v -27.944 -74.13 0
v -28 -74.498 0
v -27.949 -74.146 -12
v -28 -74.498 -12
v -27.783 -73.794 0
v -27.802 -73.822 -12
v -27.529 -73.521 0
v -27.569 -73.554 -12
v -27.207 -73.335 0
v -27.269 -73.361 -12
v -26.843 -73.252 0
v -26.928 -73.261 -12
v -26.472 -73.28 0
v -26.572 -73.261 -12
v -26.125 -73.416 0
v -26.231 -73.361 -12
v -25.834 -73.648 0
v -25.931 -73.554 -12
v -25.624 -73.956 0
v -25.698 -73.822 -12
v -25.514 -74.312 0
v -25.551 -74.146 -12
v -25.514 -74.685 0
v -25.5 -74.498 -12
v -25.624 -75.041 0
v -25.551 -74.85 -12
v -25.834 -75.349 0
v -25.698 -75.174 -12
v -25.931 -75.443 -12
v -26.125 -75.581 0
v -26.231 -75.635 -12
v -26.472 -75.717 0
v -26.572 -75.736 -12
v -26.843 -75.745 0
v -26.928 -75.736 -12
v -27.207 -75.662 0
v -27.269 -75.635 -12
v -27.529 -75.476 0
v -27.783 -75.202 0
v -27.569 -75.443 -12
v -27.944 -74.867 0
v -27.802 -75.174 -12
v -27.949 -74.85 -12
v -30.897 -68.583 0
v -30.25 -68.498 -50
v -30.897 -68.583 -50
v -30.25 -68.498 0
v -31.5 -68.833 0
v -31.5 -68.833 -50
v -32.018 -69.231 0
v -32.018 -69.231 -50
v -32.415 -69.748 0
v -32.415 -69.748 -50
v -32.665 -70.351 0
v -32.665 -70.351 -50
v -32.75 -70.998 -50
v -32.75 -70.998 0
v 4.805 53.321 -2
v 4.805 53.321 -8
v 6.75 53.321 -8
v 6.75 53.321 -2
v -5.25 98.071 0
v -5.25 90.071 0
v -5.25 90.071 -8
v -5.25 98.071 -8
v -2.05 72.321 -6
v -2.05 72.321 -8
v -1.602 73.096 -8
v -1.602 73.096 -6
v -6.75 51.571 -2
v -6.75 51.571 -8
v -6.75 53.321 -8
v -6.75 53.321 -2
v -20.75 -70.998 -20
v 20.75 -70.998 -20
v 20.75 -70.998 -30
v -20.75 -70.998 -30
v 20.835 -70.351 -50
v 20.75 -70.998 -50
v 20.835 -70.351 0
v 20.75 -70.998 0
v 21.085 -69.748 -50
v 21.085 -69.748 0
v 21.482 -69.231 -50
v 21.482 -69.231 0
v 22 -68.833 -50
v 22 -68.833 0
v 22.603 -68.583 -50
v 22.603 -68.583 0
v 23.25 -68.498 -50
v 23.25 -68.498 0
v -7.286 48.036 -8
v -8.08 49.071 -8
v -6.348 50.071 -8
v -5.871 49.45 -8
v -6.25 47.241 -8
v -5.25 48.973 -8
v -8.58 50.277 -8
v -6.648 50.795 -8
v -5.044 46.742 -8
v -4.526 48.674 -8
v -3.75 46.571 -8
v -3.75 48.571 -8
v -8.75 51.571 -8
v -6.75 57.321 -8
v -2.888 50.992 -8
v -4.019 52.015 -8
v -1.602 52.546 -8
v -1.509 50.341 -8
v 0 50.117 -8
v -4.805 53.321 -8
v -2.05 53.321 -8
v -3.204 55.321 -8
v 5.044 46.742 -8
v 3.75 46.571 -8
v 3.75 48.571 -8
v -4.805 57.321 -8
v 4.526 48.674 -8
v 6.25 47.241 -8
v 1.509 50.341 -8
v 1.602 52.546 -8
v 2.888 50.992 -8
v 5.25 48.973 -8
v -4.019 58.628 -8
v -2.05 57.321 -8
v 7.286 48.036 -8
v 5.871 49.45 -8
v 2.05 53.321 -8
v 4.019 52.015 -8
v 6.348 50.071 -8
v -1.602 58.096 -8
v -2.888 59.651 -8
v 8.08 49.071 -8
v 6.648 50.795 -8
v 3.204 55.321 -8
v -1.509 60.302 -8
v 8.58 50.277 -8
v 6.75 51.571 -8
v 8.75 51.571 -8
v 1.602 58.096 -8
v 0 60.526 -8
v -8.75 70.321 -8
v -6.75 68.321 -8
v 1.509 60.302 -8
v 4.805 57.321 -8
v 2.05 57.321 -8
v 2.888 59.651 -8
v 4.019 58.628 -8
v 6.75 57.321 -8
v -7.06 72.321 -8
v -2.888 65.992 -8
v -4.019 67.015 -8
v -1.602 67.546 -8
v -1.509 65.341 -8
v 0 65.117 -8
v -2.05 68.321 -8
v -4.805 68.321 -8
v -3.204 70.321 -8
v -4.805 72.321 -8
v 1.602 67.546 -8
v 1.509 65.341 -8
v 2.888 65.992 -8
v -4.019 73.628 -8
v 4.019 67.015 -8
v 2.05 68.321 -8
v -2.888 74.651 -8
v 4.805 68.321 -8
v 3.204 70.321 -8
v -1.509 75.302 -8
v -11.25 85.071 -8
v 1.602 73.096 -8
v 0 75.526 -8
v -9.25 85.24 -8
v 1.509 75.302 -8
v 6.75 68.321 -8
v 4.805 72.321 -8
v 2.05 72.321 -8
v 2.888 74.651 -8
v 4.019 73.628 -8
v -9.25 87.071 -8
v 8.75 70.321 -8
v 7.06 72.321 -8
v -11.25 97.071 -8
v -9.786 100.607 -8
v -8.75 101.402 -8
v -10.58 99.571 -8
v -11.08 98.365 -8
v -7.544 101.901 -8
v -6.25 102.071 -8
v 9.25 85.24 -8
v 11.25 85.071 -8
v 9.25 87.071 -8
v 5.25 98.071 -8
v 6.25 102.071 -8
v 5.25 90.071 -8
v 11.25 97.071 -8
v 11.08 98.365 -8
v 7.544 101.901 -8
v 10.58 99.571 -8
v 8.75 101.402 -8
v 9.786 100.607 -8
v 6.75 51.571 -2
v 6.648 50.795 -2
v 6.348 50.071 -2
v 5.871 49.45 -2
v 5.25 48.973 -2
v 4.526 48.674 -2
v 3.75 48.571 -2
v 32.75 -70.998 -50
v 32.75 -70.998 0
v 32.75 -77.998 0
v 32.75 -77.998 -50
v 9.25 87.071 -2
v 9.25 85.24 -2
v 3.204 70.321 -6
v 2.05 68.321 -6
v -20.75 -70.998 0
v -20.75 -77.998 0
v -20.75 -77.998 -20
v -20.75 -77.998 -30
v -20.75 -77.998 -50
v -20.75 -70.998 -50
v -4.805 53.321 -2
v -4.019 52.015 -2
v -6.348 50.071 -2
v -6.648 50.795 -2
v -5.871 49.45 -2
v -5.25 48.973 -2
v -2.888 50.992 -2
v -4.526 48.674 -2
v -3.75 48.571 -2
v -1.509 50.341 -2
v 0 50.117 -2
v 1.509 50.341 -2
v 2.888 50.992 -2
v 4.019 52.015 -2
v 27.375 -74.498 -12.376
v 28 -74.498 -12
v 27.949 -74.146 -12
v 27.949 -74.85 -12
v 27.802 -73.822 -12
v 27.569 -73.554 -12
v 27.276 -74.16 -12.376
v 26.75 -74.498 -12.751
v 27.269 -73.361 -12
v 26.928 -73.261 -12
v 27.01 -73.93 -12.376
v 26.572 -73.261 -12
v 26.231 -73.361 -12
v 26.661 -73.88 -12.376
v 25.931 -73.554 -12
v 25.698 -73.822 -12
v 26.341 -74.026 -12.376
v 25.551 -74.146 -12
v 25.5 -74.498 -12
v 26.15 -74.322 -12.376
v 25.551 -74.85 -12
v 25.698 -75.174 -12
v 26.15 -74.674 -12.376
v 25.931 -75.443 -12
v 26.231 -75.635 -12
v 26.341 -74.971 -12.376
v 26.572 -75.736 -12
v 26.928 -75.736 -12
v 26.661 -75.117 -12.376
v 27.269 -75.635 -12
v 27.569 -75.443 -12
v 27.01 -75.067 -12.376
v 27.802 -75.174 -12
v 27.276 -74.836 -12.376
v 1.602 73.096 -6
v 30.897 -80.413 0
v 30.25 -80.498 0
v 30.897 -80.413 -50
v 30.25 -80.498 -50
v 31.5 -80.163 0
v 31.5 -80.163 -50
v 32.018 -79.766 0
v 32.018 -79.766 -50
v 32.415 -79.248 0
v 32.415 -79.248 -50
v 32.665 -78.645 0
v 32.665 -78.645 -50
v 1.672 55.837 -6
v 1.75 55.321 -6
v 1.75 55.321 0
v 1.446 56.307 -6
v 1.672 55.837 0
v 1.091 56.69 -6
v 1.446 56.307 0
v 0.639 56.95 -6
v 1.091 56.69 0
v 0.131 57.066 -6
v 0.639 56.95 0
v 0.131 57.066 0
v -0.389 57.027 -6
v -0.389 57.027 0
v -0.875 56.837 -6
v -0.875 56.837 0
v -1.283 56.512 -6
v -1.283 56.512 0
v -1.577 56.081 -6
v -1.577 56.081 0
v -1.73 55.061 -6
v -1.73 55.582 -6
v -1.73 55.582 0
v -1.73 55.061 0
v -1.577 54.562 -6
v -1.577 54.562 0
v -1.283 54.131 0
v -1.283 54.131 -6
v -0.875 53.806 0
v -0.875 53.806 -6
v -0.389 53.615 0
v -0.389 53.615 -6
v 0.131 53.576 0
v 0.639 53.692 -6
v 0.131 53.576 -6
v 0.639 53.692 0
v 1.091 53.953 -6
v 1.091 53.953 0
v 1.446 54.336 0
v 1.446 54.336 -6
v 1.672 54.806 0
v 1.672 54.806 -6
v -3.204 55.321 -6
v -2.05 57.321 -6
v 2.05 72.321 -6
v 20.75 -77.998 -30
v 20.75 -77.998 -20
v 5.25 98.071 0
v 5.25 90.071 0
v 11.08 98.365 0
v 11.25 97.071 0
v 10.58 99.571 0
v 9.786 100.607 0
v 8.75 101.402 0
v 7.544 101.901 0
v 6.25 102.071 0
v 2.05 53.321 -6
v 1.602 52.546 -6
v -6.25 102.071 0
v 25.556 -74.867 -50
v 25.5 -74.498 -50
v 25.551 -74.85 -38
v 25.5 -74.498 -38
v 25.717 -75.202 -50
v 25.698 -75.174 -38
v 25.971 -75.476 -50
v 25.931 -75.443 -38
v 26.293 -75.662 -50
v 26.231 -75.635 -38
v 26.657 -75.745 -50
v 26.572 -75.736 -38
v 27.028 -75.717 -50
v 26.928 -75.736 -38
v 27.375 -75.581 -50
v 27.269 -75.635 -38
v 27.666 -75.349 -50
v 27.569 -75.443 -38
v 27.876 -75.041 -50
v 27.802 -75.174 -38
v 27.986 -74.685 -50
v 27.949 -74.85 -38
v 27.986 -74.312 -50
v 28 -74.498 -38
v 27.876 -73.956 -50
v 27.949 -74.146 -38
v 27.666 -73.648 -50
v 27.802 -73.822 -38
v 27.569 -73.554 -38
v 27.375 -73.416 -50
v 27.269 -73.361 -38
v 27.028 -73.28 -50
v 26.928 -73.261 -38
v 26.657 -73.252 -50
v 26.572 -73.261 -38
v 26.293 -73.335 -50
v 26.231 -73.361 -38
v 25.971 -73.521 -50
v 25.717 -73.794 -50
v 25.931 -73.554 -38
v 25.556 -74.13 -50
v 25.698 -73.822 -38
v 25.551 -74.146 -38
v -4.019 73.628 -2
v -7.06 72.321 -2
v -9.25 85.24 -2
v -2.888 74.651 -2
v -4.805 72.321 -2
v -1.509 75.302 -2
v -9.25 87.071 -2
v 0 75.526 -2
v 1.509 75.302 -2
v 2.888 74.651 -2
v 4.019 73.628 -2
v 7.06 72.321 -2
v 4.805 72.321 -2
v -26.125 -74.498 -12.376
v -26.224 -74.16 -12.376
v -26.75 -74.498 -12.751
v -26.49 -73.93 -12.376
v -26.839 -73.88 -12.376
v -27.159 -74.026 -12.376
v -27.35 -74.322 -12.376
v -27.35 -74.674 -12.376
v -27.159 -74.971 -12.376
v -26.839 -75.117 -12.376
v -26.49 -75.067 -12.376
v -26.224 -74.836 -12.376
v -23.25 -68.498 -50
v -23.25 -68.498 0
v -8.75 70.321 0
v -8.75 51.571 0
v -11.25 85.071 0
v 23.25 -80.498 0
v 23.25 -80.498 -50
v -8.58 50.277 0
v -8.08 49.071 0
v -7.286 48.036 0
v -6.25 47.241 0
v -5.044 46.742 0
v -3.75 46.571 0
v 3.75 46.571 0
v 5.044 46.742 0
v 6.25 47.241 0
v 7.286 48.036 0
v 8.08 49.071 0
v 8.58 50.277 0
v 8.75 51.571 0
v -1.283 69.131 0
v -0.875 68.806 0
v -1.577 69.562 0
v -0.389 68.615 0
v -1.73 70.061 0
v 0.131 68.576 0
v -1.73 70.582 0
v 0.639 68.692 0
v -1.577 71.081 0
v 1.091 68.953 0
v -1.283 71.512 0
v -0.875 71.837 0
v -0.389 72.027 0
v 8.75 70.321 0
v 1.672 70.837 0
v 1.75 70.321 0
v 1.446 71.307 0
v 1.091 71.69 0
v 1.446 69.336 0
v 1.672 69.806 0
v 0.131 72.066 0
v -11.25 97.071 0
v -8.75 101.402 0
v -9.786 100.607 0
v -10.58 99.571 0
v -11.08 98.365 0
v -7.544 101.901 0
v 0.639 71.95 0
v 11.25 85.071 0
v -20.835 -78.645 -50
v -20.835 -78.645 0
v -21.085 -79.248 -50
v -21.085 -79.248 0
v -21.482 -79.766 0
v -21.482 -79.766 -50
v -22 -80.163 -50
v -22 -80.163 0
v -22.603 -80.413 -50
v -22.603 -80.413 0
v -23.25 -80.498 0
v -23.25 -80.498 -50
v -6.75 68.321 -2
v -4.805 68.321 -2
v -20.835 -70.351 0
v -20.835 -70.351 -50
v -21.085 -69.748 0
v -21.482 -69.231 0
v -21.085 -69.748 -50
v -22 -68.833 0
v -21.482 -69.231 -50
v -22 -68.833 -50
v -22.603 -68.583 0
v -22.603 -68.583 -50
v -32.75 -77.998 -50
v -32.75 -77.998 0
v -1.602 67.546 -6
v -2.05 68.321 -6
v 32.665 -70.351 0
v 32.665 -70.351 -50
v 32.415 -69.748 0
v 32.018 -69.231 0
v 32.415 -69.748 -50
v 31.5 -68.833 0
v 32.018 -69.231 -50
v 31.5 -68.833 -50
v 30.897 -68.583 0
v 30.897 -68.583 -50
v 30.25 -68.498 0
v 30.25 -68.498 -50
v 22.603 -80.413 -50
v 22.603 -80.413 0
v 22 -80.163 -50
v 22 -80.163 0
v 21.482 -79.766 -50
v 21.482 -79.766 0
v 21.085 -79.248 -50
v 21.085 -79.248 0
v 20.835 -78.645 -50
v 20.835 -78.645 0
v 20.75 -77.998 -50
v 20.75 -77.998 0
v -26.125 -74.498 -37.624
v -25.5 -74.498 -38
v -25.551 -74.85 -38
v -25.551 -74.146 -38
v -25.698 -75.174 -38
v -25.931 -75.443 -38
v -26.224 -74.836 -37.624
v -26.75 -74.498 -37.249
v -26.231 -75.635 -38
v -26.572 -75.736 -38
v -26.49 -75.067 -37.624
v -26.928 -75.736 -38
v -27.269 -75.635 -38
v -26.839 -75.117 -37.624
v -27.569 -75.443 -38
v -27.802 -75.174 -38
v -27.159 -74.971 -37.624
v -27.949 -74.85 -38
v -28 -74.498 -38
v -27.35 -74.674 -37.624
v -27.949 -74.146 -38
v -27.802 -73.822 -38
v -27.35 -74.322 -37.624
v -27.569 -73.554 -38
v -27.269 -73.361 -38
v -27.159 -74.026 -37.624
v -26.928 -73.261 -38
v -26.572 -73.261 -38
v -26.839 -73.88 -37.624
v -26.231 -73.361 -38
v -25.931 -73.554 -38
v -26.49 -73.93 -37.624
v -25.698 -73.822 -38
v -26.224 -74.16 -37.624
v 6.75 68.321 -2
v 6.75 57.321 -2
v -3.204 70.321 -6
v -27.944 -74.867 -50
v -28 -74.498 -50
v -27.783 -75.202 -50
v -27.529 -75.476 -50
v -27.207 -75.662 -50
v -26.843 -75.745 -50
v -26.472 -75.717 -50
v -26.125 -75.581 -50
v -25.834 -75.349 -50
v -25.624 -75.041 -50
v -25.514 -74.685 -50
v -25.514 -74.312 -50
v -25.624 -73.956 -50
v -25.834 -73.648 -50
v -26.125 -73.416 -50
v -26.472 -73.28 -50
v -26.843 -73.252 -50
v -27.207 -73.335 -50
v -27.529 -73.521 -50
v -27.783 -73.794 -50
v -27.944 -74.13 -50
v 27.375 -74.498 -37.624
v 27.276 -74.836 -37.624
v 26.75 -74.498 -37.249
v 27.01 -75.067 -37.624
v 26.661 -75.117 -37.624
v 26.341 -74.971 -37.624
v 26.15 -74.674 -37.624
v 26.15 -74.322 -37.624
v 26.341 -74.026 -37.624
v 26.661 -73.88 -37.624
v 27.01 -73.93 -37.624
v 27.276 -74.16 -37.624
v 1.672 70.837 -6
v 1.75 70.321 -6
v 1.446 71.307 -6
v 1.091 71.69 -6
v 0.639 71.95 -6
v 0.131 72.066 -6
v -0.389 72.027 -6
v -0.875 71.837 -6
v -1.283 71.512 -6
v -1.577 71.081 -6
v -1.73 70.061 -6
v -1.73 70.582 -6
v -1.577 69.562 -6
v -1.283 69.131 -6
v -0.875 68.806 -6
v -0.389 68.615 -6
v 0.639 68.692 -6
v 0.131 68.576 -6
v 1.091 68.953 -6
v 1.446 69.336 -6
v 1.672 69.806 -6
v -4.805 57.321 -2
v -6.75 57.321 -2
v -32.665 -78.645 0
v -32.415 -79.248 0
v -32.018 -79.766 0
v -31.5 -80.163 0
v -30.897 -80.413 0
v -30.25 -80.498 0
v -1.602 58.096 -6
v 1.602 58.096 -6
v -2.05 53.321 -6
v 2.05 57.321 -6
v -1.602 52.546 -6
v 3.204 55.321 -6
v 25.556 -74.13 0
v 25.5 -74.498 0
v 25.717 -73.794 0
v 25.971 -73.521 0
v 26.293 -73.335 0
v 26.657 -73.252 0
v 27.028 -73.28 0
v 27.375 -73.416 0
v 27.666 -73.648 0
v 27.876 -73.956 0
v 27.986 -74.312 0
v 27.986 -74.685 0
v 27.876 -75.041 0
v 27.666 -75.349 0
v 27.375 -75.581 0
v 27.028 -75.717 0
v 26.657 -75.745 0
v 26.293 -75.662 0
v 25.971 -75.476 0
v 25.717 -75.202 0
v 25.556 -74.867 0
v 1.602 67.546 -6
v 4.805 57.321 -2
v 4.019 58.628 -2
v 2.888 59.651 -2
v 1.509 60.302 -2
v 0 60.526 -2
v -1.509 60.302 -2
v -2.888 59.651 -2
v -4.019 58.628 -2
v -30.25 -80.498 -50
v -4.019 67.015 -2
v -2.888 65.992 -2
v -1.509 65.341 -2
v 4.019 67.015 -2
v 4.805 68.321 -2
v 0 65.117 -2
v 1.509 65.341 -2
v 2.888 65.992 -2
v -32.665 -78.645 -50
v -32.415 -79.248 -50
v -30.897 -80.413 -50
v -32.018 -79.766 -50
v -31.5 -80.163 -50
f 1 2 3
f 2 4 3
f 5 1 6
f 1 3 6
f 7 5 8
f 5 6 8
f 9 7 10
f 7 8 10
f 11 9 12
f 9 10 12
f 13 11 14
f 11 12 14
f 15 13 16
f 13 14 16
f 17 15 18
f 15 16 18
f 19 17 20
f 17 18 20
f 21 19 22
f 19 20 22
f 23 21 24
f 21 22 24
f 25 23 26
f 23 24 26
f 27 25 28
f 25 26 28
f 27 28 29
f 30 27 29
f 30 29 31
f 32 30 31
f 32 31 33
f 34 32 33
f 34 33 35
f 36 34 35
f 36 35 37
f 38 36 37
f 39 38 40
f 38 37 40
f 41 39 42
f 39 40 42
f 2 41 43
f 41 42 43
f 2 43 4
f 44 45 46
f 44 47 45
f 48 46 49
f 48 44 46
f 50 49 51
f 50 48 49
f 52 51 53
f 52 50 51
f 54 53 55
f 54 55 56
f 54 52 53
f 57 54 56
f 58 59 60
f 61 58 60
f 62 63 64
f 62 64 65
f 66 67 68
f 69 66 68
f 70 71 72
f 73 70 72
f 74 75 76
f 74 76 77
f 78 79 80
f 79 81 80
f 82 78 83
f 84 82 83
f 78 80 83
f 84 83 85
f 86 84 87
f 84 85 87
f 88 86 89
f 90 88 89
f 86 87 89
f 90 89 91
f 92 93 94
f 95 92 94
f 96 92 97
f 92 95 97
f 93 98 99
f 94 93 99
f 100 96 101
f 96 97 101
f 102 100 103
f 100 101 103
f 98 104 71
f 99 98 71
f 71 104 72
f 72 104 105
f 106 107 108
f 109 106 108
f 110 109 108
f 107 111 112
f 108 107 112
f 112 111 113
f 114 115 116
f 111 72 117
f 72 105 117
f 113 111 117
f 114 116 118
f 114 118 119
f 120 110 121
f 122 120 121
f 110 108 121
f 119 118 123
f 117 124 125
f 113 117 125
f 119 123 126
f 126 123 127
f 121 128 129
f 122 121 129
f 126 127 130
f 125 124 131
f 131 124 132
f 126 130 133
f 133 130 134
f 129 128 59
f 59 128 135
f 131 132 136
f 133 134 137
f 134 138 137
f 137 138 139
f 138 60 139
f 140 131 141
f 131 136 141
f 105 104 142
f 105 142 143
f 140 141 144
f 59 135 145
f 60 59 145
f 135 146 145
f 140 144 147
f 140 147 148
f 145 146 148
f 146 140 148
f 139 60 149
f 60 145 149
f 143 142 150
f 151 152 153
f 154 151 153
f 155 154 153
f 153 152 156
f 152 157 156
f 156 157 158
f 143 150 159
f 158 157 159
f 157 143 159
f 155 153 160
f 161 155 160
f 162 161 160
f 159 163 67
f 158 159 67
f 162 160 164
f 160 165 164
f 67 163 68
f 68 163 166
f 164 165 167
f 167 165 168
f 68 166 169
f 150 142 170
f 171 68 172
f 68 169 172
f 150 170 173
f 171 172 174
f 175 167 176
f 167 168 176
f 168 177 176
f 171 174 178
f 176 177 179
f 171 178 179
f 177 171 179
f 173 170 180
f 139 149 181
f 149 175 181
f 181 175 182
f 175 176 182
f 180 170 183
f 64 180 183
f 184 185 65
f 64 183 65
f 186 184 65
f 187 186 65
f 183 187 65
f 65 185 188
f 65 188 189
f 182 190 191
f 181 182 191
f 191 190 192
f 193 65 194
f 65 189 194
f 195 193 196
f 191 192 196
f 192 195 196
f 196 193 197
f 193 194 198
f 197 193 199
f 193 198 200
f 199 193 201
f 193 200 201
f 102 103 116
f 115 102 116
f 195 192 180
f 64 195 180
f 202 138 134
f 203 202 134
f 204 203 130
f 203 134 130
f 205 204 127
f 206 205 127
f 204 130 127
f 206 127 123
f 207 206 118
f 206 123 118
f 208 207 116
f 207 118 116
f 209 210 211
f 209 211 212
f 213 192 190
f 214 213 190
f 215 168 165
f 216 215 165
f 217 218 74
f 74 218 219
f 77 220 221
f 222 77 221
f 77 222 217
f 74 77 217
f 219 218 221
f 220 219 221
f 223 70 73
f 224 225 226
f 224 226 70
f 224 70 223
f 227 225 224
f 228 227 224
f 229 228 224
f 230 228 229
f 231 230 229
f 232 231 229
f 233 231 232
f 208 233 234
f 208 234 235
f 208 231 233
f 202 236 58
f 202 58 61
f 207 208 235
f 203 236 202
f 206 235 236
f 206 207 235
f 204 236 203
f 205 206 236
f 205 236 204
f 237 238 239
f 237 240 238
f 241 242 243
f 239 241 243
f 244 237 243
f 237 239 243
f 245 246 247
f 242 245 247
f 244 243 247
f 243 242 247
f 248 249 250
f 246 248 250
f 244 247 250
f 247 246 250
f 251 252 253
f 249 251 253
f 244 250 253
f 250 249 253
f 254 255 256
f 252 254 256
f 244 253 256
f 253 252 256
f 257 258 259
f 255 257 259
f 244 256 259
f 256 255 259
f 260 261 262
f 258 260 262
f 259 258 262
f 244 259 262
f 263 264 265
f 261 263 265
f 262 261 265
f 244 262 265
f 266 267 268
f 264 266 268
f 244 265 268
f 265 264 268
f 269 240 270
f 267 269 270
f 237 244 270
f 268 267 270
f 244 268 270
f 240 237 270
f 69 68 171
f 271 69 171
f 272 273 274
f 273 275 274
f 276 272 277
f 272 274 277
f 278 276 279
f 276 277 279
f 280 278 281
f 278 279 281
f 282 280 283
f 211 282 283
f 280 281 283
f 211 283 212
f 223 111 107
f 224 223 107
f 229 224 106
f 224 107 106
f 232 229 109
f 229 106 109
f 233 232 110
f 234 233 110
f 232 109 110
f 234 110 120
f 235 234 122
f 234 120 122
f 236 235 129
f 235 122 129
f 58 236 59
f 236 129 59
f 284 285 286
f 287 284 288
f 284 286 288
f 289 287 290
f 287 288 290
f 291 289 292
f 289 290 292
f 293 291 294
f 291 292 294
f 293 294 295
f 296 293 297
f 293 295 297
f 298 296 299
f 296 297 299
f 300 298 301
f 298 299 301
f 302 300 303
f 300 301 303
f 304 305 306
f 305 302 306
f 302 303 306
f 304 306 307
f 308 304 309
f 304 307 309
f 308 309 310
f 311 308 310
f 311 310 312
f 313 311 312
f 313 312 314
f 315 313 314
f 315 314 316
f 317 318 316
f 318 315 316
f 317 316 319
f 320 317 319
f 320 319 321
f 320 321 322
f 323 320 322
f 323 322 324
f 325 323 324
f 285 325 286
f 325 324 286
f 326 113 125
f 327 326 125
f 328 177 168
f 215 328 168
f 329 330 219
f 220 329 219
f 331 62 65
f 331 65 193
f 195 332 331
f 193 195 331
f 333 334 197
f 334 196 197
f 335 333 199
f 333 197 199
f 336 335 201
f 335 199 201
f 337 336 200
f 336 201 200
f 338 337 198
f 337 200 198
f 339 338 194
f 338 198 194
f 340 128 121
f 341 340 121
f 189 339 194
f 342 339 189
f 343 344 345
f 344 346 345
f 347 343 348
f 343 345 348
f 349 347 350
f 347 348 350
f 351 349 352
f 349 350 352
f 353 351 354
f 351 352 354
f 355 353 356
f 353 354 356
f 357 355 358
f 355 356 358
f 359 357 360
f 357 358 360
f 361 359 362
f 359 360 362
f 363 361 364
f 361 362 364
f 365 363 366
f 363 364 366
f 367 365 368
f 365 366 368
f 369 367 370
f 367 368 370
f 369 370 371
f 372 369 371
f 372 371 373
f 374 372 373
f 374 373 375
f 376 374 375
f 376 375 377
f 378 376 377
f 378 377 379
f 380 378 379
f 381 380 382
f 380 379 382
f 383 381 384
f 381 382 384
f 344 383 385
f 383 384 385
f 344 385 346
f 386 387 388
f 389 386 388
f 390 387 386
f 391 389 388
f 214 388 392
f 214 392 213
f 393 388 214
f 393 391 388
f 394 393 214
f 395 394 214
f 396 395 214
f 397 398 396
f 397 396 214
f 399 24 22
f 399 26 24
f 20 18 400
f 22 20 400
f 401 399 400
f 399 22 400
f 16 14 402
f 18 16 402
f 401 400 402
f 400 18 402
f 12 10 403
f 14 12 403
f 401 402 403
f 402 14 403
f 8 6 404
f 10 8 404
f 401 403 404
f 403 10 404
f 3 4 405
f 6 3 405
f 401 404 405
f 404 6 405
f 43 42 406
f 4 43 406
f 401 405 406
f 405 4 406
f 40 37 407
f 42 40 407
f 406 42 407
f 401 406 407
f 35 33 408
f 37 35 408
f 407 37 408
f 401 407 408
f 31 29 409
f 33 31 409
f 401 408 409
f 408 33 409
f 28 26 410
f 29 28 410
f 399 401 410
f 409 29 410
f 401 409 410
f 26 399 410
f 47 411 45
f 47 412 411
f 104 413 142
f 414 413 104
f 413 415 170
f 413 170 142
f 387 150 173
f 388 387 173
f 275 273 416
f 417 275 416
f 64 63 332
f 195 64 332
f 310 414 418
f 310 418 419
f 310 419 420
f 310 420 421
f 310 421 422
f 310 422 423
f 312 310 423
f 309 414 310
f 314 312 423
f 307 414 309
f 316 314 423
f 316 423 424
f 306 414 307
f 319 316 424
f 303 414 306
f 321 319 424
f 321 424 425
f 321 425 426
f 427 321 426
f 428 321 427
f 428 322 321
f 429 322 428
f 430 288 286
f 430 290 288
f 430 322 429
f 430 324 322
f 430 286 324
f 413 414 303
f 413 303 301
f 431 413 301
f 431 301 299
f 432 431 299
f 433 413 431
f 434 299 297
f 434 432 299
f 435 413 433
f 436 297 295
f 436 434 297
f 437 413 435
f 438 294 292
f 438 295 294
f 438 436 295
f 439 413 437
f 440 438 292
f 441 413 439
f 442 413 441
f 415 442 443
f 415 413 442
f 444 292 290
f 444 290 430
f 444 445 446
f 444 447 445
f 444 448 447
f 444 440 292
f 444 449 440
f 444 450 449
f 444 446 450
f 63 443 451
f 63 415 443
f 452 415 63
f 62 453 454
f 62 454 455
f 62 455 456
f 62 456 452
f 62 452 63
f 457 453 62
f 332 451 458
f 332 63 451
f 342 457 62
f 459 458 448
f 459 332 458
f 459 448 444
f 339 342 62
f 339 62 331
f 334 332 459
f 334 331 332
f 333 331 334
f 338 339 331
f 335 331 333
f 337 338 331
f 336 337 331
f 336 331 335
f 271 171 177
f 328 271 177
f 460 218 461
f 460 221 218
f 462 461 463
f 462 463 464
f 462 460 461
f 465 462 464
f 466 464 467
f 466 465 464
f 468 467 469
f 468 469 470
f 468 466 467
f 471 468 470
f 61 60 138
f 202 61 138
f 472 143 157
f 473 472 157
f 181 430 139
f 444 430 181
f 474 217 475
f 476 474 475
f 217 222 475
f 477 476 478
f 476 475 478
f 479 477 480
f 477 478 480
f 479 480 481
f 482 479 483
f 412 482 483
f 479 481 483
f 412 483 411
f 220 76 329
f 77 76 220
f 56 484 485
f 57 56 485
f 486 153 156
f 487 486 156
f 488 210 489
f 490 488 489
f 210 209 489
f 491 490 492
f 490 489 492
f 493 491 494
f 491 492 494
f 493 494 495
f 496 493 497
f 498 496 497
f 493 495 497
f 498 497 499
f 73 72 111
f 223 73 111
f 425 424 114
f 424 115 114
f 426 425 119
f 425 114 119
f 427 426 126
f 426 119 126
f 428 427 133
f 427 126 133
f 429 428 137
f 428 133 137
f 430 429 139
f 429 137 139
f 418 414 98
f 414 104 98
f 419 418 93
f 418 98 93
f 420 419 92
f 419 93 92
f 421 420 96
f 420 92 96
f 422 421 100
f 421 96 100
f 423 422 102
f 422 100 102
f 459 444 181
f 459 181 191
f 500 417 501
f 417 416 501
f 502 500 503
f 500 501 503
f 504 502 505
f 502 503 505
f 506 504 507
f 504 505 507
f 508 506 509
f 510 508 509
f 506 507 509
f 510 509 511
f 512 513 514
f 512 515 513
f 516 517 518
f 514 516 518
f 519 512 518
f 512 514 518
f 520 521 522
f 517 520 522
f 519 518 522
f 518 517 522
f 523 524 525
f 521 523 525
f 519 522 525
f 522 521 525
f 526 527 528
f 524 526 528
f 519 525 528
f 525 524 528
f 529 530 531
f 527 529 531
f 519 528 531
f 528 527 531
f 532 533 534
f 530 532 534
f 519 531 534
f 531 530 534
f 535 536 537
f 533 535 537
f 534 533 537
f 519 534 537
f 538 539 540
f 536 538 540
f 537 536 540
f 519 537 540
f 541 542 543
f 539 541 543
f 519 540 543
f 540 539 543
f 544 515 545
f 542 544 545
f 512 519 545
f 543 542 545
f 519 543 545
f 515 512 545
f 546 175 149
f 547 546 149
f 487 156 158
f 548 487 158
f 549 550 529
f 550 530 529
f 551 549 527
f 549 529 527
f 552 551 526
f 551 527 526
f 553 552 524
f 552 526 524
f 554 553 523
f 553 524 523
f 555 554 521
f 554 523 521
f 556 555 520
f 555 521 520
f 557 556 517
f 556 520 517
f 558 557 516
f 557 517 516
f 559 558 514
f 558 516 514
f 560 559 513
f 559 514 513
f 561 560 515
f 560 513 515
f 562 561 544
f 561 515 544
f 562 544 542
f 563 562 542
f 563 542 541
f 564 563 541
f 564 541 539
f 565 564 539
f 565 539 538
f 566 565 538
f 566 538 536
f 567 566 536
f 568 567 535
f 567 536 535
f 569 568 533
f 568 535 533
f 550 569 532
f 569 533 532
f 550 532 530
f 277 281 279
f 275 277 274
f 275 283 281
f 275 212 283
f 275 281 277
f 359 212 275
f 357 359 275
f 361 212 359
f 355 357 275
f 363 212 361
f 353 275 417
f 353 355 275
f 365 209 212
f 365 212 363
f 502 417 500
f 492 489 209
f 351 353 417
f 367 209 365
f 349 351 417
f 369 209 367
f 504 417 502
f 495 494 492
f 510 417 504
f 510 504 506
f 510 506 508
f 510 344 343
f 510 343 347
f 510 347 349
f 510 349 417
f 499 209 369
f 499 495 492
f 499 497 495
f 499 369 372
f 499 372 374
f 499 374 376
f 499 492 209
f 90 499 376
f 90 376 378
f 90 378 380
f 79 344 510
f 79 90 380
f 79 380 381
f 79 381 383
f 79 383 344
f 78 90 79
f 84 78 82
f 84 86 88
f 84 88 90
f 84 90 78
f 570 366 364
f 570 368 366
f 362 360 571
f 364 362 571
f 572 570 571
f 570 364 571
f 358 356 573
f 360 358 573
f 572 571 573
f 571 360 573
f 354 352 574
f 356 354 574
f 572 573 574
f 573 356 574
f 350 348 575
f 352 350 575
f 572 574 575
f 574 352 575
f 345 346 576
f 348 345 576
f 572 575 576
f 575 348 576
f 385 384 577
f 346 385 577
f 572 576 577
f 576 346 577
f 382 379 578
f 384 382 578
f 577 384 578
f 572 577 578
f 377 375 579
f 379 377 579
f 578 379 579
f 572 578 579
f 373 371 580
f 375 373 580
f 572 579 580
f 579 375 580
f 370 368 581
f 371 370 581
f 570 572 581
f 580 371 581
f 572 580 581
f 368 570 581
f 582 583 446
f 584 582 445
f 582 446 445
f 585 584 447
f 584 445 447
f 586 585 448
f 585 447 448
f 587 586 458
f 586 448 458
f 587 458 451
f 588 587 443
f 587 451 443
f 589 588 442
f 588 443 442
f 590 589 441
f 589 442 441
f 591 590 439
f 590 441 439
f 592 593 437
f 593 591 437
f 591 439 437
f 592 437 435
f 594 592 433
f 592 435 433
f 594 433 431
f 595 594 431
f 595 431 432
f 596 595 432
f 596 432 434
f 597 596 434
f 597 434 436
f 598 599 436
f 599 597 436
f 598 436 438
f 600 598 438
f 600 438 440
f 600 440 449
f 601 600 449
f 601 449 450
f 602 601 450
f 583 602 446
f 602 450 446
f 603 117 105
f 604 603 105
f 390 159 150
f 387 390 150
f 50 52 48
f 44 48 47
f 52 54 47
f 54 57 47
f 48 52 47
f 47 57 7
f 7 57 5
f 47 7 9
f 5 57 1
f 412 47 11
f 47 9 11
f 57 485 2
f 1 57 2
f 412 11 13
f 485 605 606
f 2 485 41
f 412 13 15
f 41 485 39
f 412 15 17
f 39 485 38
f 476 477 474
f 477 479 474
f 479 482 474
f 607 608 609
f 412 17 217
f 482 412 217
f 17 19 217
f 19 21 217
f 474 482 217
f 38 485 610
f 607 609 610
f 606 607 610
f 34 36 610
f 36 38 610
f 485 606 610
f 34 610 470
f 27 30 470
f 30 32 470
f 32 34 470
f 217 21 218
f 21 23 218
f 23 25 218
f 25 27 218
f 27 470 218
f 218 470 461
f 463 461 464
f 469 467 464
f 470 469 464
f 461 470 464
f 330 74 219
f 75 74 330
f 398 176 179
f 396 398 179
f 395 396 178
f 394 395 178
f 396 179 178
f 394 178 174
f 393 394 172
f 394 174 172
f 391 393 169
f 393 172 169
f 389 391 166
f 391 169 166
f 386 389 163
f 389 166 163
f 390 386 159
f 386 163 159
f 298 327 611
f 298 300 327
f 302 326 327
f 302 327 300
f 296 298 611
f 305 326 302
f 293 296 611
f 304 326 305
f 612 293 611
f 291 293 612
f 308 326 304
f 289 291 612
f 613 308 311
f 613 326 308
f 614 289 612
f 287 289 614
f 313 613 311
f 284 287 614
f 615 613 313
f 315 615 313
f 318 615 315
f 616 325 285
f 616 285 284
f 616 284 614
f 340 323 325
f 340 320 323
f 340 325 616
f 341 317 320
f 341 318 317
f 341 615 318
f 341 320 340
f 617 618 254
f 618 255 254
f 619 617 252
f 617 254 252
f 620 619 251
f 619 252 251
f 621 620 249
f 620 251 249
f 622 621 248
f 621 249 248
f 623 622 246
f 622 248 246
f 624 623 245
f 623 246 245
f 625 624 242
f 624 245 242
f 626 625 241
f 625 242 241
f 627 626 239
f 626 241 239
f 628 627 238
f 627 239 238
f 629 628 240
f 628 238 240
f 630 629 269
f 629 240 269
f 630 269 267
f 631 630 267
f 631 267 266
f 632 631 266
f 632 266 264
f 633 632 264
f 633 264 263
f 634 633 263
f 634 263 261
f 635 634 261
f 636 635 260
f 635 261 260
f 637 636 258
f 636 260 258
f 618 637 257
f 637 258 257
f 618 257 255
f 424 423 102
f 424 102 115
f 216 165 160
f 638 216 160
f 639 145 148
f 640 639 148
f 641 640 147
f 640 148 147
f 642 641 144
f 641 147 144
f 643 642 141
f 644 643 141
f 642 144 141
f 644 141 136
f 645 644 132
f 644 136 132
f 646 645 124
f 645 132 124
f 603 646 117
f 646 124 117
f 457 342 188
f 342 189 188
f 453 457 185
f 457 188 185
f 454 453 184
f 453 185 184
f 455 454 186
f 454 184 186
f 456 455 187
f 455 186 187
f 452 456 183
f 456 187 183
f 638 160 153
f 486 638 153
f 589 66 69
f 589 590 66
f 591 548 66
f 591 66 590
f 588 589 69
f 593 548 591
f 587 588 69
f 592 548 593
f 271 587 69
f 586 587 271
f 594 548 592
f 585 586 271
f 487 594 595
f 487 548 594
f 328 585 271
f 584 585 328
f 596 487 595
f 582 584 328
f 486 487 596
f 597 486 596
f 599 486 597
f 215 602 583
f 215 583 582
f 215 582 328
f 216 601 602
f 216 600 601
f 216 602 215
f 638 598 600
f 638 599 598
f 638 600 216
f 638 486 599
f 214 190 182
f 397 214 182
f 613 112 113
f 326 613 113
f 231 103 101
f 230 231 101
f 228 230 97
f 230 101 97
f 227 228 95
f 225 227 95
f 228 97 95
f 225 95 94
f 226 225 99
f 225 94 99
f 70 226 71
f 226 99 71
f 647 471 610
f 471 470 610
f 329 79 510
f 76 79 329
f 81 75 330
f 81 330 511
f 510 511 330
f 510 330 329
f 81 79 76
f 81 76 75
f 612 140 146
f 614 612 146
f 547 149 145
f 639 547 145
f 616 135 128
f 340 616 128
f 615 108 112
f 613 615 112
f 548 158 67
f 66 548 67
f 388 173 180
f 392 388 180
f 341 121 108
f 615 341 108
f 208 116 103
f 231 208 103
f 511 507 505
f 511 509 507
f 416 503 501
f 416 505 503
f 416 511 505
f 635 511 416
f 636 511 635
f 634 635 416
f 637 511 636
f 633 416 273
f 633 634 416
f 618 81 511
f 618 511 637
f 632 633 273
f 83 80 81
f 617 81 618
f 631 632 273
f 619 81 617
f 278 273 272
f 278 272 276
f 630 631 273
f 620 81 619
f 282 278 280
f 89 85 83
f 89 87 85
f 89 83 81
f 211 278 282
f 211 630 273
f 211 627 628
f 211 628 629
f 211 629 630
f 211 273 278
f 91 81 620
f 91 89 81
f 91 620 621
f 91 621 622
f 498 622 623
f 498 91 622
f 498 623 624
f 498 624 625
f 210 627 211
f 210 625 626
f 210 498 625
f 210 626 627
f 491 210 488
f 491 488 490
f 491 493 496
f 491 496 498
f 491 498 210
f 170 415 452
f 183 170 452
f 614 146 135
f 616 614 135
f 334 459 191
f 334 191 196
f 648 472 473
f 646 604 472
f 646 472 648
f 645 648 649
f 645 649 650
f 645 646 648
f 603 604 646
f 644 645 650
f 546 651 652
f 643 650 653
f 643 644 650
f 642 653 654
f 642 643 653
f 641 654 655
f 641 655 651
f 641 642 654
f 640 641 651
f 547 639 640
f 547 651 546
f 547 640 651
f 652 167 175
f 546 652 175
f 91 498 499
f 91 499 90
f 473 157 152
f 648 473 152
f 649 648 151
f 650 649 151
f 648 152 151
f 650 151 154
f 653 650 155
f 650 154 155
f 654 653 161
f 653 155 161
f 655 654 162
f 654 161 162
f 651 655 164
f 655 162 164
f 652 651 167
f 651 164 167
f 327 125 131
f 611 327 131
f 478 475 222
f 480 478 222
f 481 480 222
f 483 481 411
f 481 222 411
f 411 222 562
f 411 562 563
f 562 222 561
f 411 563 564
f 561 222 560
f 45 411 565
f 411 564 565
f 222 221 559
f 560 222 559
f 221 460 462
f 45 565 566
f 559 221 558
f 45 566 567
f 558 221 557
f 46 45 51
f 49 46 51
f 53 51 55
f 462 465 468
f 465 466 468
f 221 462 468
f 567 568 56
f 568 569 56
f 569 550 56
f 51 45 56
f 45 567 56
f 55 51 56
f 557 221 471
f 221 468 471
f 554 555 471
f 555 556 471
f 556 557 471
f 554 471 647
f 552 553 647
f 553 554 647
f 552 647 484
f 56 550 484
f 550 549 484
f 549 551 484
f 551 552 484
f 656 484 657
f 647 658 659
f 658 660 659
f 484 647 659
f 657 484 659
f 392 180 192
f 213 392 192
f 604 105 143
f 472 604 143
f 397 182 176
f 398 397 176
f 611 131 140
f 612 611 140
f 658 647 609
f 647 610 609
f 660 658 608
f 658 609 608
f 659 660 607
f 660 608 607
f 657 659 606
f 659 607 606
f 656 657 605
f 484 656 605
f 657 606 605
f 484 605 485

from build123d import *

# Parameters (mm, degrees)
F7_W      = 2.5
F7_H      = 17
F7_W_2    = 17.5
F7_W_3    = 10.5
F7_H_2    = 8
F7_R      = 1.75
F8_DEPTH  = 8
F9_R      = 5
F11_DEPTH = 6
F10_R     = 1.75
F12_DEPTH = 2
F15_DEPTH = 3.5
F16_DEPTH = 6
F18_D     = 2.5
F18_DEPTH = 12
F18_TIP   = 0.7510757738
F20_D     = 2.5
F20_DEPTH = 12
F20_TIP   = 0.7510757738
F21_R     = 2.49999


# Not quite as in the source:
# - a fillet or chamfer is up to 0.001 mm smaller than in the source, because OpenCascade refuses the exact size


with BuildPart() as f8:
    # F7 (on Top) → F8 (new body)
    with BuildSketch(Plane.XY):
        with Locations((10, 93.5713741661)):
            Rectangle(F7_W, F7_H)
        with Locations((0, 93.5713741661)):
            Rectangle(F7_W_2, F7_H)
        with Locations((0, 94.0713741661)):
            Rectangle(F7_W_3, F7_H_2, mode=Mode.SUBTRACT)
        with Locations((-10, 93.5713741661)):
            Rectangle(F7_W, F7_H)
        Polygon((-11.25, 85.0713741661), (-8.75, 70.3213741661), (-8.75, 85.0713741661), align=None)
        Polygon((-8.75, 46.5713741661), (8.75, 46.5713741661), (8.75, 70.3213741661), (8.75, 85.0713741661), (-8.75, 85.0713741661), (-8.75, 70.3213741661), align=None)
        with Locations((0, 55.3213741661)):
            Circle(F7_R, mode=Mode.SUBTRACT)
        with Locations((0, 70.3213741661)):
            Circle(F7_R, mode=Mode.SUBTRACT)
        Polygon((8.75, 85.0713741661), (8.75, 70.3213741661), (11.25, 85.0713741661), align=None)
    extrude(amount=-F8_DEPTH)

    # F9
    f9_edges = [f8.edges().sort_by_distance(p)[0] for p in [
        (11.25, 102.071374, -4),
        (8.75, 46.571374, -4),
        (-8.75, 46.571374, -4),
        (-11.25, 102.071374, -4),
    ]]
    fillet(f9_edges, radius=F9_R)

    # F10 (on face) → F11 (cut)
    with BuildSketch(Plane(origin=(0, 0, -8), x_dir=(1, 0, 0), z_dir=(0, 0, -1))):
        with BuildLine():
            Line((6.75, -57.3213741661), (4.8046514937, -57.3213741661))
            ThreePointArc((4.8046514937, -57.3213741661), (0, -60.5256681601), (-4.8046514937, -57.3213741661))
            Line((-4.8046514937, -57.3213741661), (-6.75, -57.3213741661))
            Line((-6.75, -57.3213741661), (-6.75, -68.3213741661))
            Line((-6.75, -68.3213741661), (-4.8046514937, -68.3213741661))
            ThreePointArc((-4.8046514937, -68.3213741661), (0, -65.1170801721), (4.8046514937, -68.3213741661))
            Line((4.8046514937, -68.3213741661), (6.75, -68.3213741661))
            Line((6.75, -68.3213741661), (6.75, -57.3213741661))
        make_face()
        with BuildLine():
            Line((-6.75, -53.3213741661), (-4.8046514937, -53.3213741661))
            ThreePointArc((-4.8046514937, -53.3213741661), (0, -50.1170801721), (4.8046514937, -53.3213741661))
            Line((4.8046514937, -53.3213741661), (6.75, -53.3213741661))
            Line((6.75, -53.3213741661), (6.75, -51.5713741661))
            ThreePointArc((6.75, -51.5713741661), (5.8713203436, -49.4500538226), (3.75, -48.5713741661))
            Line((3.75, -48.5713741661), (-3.75, -48.5713741661))
            ThreePointArc((-3.75, -48.5713741661), (-5.8713203436, -49.4500538226), (-6.75, -51.5713741661))
            Line((-6.75, -51.5713741661), (-6.75, -53.3213741661))
        make_face()
        with BuildLine():
            Line((9.25, -85.2396656064), (7.0604590779, -72.3213741661))
            Line((7.0604590779, -72.3213741661), (4.8046514937, -72.3213741661))
            ThreePointArc((4.8046514937, -72.3213741661), (0, -75.5256681601), (-4.8046514937, -72.3213741661))
            Line((-4.8046514937, -72.3213741661), (-7.0604590779, -72.3213741661))
            Line((-7.0604590779, -72.3213741661), (-9.25, -85.2396656064))
            Line((-9.25, -85.2396656064), (-9.25, -87.0713741661))
            Line((-9.25, -87.0713741661), (9.25, -87.0713741661))
            Line((9.25, -87.0713741661), (9.25, -85.2396656064))
        make_face()
    extrude(amount=-F11_DEPTH, mode=Mode.SUBTRACT)

    # F10 (on face) → F12 (cut)
    with BuildSketch(Plane(origin=(0, 0, -8), x_dir=(1, 0, 0), z_dir=(0, 0, -1))):
        Polygon((-2.0495934556, -57.3213741661), (2.0495934556, -57.3213741661), (3.204293994, -55.3213741661), (2.0495934556, -53.3213741661), (-2.0495934556, -53.3213741661), (-3.204293994, -55.3213741661), align=None)
        with Locations((0, -55.3213741661)):
            Circle(F10_R, mode=Mode.SUBTRACT)
        Polygon((-1.602146997, -58.0963741661), (1.602146997, -58.0963741661), (2.0495934556, -57.3213741661), (-2.0495934556, -57.3213741661), align=None)
        Polygon((-2.0495934556, -53.3213741661), (2.0495934556, -53.3213741661), (1.602146997, -52.5463741661), (-1.602146997, -52.5463741661), align=None)
        Polygon((2.0495934556, -72.3213741661), (-2.0495934556, -72.3213741661), (-1.602146997, -73.0963741661), (1.602146997, -73.0963741661), align=None)
        Polygon((3.204293994, -70.3213741661), (2.0495934556, -68.3213741661), (-2.0495934556, -68.3213741661), (-3.204293994, -70.3213741661), (-2.0495934556, -72.3213741661), (2.0495934556, -72.3213741661), align=None)
        with Locations((0, -70.3213741661)):
            Circle(F10_R, mode=Mode.SUBTRACT)
        Polygon((-2.0495934556, -68.3213741661), (2.0495934556, -68.3213741661), (1.602146997, -67.5463741661), (-1.602146997, -67.5463741661), align=None)
    extrude(amount=-F12_DEPTH, mode=Mode.SUBTRACT)


with BuildPart() as f15:
    # F14 (on line) → F15 (new body, symmetric)
    with BuildSketch(Plane(origin=(0, -74.4982883334, 0), x_dir=(-1, 0, 0), z_dir=(0, 1, 0))):
        Polygon((20.75, -20), (0, -20), (-20.75, -20), (-20.75, -30), (0, -30), (20.75, -30), align=None)
    extrude(amount=F15_DEPTH, both=True)

    # F14 (on line) → F16 (join, symmetric)
    with BuildSketch(Plane(origin=(0, -74.4982883334, 0), x_dir=(-1, 0, 0), z_dir=(0, 1, 0))):
        Polygon((20.75, 0), (20.75, -20), (20.75, -30), (20.75, -50), (32.75, -50), (32.75, -25), (32.75, 0), align=None)
        Polygon((-20.75, -30), (-20.75, -20), (-20.75, 0), (-32.75, 0), (-32.75, -25), (-32.75, -50), (-20.75, -50), align=None)
    extrude(amount=F16_DEPTH, both=True)

    # F18
    with Locations(Plane.XY):
        with Locations((-26.75, -74.4982883334), (26.75, -74.4982883334)):
            Hole(F18_D / 2, depth=F18_DEPTH)
            with Locations((0, 0, -(F18_DEPTH + F18_TIP / 2))):  # 118° drill point
                Cone(0, F18_D / 2, F18_TIP, mode=Mode.SUBTRACT)

    # F20
    with Locations(Plane(origin=(0, 0, -50), x_dir=(1, 0, 0), z_dir=(0, 0, -1))):
        with Locations((-26.75, 74.4982883334), (26.75, 74.4982883334)):
            Hole(F20_D / 2, depth=F20_DEPTH)
            with Locations((0, 0, -(F20_DEPTH + F20_TIP / 2))):  # 118° drill point
                Cone(0, F20_D / 2, F20_TIP, mode=Mode.SUBTRACT)

    # F21 (radius 2.5 in the source; OpenCascade refuses exactly that, so slightly less here)
    f21_edges = [f15.edges().sort_by_distance(p)[0] for p in [
        (-20.75, -80.498288, -25),
        (-20.75, -68.498288, -25),
        (-32.75, -80.498288, -25),
        (20.75, -80.498288, -25),
        (32.75, -80.498288, -25),
        (32.75, -68.498288, -25),
        (-32.75, -68.498288, -25),
        (20.75, -68.498288, -25),
    ]]
    fillet(f21_edges, radius=F21_R)


solid = Compound([f8.part, f15.part])
